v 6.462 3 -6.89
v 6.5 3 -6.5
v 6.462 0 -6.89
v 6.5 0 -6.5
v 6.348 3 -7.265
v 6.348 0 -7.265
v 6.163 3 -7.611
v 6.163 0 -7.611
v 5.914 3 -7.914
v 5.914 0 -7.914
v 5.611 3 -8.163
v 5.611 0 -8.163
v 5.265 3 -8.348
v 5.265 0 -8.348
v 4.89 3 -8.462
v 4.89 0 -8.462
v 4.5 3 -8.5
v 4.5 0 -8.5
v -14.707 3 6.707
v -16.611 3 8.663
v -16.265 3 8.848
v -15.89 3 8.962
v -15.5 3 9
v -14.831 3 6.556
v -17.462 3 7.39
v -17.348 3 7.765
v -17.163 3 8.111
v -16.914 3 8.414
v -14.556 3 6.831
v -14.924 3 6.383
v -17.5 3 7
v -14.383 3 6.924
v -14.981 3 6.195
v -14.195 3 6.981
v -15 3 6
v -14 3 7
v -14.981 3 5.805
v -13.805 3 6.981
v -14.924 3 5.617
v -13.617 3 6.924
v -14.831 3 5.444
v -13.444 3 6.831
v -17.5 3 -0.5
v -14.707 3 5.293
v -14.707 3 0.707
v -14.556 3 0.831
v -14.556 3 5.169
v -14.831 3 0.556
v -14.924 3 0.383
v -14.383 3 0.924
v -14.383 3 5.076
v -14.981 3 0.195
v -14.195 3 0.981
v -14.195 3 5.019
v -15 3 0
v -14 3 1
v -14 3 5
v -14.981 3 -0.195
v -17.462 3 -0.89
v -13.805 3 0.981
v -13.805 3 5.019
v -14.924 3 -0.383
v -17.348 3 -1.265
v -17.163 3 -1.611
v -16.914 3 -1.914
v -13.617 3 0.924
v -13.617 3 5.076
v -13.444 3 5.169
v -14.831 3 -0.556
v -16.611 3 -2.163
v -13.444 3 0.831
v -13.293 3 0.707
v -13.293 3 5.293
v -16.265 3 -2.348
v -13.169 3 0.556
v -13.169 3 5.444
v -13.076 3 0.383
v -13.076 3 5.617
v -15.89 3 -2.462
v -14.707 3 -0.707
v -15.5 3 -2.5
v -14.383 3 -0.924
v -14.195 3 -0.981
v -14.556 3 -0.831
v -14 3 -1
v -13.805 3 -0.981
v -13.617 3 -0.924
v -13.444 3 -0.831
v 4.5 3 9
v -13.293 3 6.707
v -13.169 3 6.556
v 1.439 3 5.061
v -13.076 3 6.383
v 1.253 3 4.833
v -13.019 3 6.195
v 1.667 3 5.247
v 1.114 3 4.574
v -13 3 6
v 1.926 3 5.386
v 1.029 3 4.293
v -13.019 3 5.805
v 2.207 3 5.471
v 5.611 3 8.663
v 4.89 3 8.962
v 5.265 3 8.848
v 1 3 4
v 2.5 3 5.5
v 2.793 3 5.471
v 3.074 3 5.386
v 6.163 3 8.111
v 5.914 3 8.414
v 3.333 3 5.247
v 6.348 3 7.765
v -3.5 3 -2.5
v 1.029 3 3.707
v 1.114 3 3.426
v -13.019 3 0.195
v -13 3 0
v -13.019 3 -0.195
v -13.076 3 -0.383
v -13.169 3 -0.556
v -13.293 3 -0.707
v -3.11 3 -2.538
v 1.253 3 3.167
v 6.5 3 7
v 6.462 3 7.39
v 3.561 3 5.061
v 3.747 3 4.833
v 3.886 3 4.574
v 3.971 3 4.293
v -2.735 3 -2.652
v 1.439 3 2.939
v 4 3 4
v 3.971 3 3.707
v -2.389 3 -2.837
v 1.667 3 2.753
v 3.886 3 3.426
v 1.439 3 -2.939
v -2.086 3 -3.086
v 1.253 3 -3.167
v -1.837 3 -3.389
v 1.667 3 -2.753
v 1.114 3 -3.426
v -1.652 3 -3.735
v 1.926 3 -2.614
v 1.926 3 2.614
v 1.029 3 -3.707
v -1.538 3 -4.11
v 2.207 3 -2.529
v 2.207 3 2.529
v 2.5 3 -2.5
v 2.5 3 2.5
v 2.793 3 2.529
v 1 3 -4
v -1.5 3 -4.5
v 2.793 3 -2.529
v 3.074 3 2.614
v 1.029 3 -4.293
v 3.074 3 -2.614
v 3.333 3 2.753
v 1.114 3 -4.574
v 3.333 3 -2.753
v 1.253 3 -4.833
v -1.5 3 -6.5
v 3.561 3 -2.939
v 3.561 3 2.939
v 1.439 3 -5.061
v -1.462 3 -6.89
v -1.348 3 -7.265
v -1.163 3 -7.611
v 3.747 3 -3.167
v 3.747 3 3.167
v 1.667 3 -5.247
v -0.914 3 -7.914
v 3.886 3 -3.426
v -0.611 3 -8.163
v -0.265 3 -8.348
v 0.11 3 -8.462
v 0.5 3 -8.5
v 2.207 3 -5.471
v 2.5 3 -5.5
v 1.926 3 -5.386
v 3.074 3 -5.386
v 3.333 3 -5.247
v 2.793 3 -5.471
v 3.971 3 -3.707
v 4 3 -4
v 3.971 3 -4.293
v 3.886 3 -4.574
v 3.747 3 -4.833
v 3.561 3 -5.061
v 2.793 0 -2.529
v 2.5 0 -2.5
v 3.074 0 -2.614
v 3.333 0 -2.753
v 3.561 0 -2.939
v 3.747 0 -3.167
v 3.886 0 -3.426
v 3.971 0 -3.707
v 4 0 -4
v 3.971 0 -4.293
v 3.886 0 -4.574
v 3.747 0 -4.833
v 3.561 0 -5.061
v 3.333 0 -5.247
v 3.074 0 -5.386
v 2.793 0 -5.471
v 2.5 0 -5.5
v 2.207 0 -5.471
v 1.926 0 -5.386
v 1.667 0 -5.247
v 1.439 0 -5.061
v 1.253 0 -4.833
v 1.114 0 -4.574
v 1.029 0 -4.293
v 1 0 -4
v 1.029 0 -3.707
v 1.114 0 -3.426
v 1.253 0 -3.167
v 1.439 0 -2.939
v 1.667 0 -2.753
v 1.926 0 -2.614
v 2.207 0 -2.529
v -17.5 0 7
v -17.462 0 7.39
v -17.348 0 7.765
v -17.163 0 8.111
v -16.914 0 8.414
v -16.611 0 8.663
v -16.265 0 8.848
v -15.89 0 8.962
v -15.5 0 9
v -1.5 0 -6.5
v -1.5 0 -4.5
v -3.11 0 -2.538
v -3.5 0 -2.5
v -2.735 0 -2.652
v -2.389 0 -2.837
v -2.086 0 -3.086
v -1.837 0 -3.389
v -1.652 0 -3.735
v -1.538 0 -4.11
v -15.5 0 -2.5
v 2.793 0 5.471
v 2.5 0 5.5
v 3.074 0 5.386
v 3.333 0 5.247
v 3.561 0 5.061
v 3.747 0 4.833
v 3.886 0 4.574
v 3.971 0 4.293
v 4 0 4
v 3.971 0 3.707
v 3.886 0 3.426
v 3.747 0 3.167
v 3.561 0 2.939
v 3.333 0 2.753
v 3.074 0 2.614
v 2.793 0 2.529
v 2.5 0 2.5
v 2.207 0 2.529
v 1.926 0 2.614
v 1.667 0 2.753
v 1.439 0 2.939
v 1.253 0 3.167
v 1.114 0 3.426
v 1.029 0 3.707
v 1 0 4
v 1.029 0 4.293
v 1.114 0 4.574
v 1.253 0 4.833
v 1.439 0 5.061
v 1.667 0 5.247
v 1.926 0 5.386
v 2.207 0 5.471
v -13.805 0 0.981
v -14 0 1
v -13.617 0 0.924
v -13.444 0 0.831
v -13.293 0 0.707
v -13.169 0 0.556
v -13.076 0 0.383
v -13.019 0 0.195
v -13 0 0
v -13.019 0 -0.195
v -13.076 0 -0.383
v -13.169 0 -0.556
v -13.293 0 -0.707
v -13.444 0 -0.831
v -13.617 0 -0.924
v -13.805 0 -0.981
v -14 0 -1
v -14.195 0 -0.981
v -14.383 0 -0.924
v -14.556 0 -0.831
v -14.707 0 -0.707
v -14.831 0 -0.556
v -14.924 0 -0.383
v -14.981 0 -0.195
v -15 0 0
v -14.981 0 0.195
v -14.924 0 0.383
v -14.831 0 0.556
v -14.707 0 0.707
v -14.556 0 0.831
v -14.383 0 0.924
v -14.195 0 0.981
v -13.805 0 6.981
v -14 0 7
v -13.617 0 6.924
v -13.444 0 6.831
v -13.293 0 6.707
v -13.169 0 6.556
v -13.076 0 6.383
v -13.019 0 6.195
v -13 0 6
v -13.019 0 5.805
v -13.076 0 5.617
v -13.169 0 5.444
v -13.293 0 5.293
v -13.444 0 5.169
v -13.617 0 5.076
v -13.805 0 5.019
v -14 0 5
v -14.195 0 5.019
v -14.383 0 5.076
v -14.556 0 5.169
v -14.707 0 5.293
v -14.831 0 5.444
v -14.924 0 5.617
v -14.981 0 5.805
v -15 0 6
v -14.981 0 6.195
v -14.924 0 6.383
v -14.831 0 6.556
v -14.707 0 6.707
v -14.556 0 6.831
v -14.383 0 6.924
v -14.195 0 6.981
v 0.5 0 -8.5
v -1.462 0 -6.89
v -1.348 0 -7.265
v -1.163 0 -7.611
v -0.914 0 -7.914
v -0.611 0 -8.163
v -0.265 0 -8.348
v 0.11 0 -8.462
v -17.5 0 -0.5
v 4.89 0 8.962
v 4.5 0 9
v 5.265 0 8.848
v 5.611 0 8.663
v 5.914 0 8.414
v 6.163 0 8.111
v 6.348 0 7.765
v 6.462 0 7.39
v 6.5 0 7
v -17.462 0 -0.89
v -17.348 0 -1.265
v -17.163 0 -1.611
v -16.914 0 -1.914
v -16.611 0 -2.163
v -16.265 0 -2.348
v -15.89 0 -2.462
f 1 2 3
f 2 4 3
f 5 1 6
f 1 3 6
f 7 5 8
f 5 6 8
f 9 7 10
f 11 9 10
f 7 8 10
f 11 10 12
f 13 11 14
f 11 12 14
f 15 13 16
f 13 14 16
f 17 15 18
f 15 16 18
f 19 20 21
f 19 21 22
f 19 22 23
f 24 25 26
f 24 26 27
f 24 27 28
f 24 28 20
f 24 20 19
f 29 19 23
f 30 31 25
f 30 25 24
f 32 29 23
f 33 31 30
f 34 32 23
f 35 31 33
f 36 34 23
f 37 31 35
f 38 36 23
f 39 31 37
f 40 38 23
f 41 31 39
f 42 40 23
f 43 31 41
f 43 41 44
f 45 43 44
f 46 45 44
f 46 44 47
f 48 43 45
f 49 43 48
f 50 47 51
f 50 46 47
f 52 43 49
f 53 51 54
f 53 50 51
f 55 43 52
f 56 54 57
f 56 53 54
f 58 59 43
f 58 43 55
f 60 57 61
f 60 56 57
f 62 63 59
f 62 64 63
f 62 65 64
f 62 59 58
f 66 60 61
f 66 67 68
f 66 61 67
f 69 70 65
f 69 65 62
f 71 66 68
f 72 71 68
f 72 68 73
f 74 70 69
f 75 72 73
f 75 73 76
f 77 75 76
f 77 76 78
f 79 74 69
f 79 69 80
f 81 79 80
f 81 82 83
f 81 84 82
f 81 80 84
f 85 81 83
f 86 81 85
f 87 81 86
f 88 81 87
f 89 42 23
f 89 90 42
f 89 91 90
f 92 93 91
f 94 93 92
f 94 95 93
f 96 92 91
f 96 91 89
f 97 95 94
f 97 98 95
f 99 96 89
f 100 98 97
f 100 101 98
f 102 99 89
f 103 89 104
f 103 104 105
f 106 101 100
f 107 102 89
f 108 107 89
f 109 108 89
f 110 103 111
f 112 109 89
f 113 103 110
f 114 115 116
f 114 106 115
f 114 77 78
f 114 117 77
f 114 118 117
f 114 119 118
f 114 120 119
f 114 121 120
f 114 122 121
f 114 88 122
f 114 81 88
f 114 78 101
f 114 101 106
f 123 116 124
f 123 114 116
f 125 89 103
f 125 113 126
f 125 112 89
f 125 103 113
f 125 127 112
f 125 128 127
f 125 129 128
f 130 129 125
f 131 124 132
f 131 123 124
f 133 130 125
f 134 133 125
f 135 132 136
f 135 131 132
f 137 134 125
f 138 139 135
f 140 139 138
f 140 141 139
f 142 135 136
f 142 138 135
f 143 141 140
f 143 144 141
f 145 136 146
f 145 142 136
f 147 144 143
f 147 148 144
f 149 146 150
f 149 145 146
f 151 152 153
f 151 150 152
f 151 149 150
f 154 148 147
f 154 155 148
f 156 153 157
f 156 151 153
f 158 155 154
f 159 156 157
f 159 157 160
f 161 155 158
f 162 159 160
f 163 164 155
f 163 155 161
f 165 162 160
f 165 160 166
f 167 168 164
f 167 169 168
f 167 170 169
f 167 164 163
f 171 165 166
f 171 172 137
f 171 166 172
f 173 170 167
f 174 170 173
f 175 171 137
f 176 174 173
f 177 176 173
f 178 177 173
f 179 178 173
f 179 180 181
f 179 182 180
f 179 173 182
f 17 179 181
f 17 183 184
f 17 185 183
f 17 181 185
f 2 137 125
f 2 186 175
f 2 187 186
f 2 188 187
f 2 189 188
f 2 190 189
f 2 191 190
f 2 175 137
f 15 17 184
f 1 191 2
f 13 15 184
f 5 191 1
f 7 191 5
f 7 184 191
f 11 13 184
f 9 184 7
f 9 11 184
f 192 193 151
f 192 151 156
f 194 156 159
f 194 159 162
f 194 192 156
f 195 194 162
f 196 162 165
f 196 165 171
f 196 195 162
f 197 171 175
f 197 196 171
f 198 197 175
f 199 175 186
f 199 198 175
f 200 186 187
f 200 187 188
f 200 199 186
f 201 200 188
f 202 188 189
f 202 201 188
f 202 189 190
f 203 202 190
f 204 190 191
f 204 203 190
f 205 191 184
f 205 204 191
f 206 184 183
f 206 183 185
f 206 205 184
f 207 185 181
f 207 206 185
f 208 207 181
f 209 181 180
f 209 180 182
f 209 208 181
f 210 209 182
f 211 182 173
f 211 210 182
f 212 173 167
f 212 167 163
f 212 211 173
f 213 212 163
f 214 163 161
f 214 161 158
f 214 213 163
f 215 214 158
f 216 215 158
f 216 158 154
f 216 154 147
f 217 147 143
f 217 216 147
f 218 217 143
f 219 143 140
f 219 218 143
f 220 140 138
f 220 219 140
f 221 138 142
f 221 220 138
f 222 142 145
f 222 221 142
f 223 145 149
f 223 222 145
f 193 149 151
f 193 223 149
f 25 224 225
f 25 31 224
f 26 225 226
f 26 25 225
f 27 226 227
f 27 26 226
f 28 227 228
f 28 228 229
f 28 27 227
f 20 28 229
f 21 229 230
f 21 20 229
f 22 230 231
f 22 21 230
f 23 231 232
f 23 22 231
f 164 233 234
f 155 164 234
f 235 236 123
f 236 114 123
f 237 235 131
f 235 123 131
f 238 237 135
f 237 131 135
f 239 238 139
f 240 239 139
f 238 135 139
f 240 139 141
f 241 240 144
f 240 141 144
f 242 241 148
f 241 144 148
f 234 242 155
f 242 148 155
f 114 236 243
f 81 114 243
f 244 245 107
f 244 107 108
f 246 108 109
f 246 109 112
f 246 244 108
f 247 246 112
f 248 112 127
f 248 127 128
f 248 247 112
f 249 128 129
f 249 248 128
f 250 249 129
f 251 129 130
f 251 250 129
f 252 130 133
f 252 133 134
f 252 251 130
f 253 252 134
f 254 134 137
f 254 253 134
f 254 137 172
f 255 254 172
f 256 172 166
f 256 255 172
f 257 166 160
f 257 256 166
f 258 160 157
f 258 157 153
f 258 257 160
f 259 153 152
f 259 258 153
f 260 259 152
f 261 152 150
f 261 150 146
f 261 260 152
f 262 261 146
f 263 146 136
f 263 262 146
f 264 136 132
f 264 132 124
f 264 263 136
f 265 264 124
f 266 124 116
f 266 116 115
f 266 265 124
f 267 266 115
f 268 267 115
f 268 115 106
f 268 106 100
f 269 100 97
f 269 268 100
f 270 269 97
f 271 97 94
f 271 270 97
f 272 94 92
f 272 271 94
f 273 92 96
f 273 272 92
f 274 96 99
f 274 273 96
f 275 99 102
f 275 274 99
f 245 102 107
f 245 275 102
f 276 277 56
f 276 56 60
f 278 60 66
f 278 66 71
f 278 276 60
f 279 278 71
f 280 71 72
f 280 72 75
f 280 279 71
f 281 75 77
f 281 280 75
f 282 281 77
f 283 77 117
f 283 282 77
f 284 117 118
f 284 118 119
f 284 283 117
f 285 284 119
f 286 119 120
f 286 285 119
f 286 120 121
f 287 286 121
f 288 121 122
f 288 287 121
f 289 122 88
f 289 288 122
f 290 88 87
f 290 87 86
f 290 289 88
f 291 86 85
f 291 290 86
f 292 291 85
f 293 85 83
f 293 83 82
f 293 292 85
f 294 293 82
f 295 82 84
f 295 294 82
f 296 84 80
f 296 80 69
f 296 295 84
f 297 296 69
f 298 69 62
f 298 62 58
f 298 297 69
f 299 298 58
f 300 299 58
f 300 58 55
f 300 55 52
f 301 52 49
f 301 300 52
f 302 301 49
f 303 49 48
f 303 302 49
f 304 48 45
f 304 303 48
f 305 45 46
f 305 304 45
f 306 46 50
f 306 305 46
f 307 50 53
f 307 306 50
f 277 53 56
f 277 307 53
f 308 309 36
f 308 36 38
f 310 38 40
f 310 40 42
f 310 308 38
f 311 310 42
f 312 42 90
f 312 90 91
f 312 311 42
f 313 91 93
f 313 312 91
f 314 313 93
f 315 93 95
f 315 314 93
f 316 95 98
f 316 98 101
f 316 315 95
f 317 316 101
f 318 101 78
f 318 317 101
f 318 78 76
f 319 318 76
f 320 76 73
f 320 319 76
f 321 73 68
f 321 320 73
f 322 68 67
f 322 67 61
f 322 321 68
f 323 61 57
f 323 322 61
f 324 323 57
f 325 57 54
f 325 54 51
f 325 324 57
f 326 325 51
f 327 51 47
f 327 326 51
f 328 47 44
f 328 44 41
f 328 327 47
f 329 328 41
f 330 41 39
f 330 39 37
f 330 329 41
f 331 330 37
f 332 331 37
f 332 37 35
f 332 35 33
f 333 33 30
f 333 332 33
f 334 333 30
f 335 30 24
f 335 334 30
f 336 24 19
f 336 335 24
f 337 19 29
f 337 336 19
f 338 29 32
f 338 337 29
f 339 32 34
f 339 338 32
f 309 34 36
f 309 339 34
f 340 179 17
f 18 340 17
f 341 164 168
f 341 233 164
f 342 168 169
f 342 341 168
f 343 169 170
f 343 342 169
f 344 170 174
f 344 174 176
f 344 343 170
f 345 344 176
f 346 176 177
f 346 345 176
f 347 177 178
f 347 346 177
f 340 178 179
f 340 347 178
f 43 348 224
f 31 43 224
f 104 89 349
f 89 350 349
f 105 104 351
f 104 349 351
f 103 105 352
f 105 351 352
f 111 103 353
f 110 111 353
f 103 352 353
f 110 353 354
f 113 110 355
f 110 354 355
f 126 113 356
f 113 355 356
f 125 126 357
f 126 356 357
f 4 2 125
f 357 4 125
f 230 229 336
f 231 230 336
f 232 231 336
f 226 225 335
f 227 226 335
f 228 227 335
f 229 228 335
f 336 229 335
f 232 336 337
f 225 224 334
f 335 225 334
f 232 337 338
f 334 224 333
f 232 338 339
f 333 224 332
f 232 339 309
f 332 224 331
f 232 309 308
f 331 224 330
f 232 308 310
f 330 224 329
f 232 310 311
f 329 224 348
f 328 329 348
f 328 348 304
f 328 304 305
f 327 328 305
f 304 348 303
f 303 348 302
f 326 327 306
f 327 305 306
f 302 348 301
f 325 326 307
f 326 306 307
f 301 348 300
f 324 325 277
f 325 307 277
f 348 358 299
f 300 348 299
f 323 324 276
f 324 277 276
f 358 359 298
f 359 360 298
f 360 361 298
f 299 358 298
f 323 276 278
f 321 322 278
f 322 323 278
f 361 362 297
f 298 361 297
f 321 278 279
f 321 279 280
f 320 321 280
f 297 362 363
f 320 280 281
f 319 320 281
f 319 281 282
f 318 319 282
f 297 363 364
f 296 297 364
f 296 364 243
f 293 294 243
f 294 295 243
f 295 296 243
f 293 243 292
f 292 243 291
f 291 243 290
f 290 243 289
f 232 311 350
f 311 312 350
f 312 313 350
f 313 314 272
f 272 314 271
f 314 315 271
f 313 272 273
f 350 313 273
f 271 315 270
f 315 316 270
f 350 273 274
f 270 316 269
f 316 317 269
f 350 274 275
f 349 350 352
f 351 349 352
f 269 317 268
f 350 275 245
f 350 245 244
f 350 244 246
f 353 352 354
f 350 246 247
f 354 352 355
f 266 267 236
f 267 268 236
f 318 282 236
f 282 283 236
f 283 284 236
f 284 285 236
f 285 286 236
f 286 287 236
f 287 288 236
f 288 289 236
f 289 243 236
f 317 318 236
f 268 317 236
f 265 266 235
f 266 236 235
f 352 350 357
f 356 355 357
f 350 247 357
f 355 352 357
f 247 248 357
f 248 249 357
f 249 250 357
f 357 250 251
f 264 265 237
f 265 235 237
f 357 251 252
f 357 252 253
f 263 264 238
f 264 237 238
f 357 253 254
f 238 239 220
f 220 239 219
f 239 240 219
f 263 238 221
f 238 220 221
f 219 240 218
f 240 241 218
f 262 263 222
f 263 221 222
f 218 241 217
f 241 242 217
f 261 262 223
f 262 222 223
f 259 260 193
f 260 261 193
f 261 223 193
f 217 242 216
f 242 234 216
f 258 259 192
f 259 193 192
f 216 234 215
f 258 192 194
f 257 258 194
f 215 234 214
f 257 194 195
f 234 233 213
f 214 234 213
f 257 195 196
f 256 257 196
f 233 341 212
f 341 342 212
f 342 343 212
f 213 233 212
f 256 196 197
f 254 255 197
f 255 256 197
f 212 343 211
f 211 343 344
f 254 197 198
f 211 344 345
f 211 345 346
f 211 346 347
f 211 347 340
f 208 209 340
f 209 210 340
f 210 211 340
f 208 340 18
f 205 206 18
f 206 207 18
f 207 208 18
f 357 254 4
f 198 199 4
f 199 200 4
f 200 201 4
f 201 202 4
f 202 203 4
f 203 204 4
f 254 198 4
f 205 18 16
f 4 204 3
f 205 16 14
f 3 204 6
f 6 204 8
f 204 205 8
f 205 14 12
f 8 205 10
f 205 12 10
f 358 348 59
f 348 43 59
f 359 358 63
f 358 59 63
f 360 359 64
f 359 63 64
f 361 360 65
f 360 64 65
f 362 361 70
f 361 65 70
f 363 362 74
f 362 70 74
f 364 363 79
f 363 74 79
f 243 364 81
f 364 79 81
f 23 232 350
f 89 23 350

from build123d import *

# Parameters (mm, degrees)
SKETCH_1_R          = 1
SKETCH_1_R_2        = 1.5
EXTRUDE_1_DEPTH     = 3
SKETCH_2_W          = 8
SKETCH_2_H          = 0.5
CUT_EXTRUDE_1_DEPTH = 10
FILLET_1_R          = 2


with BuildPart() as part:
    # 草图1 → 凸台-拉伸1 (new body)
    with BuildSketch(Plane(origin=(0, 0, 0), x_dir=(1, 0, 0), z_dir=(0, 1, 0))):
        Polygon((-17.5, 2.5), (-17.5, -9), (17.5, -9), (17.5, 9), (-1.5, 9), (-1.5, 2.5), align=None)
        with Locations(Location((-14, -6, 0), (0, 0, 270))):
            Circle(SKETCH_1_R, mode=Mode.SUBTRACT)
        with Locations(Location((2.5, -4, 0), (0, 0, 270))):
            Circle(SKETCH_1_R_2, mode=Mode.SUBTRACT)
        with Locations(Location((-14, 0, 0), (0, 0, 270))):
            Circle(SKETCH_1_R, mode=Mode.SUBTRACT)
        with Locations(Location((2.5, 4, 0), (0, 0, 270))):
            Circle(SKETCH_1_R_2, mode=Mode.SUBTRACT)
    extrude(amount=EXTRUDE_1_DEPTH)

    # 草图2 → 切除-拉伸1 (cut)
    with BuildSketch(Plane(origin=(0, 3, 0), x_dir=(1, 0, 0), z_dir=(0, 1, 0))):
        with Locations((2.5, 8.75)):
            Rectangle(SKETCH_2_W, SKETCH_2_H)
        Polygon((17.5, -9), (17.5, 9), (6.5, 9), (6.5, 8.5), (6.5, -9), align=None)
    extrude(amount=-CUT_EXTRUDE_1_DEPTH, mode=Mode.SUBTRACT)

    # 圆角1
    fillet_1_edges = [part.edges().sort_by_distance(p)[0] for p in [
        (-17.5, 1.5, 9),
        (-17.5, 1.5, -2.5),
        (-1.5, 1.5, -2.5),
        (-1.5, 1.5, -8.5),
        (6.5, 1.5, 9),
        (6.5, 1.5, -8.5),
    ]]
    fillet(fillet_1_edges, radius=FILLET_1_R)


solid = part.part
